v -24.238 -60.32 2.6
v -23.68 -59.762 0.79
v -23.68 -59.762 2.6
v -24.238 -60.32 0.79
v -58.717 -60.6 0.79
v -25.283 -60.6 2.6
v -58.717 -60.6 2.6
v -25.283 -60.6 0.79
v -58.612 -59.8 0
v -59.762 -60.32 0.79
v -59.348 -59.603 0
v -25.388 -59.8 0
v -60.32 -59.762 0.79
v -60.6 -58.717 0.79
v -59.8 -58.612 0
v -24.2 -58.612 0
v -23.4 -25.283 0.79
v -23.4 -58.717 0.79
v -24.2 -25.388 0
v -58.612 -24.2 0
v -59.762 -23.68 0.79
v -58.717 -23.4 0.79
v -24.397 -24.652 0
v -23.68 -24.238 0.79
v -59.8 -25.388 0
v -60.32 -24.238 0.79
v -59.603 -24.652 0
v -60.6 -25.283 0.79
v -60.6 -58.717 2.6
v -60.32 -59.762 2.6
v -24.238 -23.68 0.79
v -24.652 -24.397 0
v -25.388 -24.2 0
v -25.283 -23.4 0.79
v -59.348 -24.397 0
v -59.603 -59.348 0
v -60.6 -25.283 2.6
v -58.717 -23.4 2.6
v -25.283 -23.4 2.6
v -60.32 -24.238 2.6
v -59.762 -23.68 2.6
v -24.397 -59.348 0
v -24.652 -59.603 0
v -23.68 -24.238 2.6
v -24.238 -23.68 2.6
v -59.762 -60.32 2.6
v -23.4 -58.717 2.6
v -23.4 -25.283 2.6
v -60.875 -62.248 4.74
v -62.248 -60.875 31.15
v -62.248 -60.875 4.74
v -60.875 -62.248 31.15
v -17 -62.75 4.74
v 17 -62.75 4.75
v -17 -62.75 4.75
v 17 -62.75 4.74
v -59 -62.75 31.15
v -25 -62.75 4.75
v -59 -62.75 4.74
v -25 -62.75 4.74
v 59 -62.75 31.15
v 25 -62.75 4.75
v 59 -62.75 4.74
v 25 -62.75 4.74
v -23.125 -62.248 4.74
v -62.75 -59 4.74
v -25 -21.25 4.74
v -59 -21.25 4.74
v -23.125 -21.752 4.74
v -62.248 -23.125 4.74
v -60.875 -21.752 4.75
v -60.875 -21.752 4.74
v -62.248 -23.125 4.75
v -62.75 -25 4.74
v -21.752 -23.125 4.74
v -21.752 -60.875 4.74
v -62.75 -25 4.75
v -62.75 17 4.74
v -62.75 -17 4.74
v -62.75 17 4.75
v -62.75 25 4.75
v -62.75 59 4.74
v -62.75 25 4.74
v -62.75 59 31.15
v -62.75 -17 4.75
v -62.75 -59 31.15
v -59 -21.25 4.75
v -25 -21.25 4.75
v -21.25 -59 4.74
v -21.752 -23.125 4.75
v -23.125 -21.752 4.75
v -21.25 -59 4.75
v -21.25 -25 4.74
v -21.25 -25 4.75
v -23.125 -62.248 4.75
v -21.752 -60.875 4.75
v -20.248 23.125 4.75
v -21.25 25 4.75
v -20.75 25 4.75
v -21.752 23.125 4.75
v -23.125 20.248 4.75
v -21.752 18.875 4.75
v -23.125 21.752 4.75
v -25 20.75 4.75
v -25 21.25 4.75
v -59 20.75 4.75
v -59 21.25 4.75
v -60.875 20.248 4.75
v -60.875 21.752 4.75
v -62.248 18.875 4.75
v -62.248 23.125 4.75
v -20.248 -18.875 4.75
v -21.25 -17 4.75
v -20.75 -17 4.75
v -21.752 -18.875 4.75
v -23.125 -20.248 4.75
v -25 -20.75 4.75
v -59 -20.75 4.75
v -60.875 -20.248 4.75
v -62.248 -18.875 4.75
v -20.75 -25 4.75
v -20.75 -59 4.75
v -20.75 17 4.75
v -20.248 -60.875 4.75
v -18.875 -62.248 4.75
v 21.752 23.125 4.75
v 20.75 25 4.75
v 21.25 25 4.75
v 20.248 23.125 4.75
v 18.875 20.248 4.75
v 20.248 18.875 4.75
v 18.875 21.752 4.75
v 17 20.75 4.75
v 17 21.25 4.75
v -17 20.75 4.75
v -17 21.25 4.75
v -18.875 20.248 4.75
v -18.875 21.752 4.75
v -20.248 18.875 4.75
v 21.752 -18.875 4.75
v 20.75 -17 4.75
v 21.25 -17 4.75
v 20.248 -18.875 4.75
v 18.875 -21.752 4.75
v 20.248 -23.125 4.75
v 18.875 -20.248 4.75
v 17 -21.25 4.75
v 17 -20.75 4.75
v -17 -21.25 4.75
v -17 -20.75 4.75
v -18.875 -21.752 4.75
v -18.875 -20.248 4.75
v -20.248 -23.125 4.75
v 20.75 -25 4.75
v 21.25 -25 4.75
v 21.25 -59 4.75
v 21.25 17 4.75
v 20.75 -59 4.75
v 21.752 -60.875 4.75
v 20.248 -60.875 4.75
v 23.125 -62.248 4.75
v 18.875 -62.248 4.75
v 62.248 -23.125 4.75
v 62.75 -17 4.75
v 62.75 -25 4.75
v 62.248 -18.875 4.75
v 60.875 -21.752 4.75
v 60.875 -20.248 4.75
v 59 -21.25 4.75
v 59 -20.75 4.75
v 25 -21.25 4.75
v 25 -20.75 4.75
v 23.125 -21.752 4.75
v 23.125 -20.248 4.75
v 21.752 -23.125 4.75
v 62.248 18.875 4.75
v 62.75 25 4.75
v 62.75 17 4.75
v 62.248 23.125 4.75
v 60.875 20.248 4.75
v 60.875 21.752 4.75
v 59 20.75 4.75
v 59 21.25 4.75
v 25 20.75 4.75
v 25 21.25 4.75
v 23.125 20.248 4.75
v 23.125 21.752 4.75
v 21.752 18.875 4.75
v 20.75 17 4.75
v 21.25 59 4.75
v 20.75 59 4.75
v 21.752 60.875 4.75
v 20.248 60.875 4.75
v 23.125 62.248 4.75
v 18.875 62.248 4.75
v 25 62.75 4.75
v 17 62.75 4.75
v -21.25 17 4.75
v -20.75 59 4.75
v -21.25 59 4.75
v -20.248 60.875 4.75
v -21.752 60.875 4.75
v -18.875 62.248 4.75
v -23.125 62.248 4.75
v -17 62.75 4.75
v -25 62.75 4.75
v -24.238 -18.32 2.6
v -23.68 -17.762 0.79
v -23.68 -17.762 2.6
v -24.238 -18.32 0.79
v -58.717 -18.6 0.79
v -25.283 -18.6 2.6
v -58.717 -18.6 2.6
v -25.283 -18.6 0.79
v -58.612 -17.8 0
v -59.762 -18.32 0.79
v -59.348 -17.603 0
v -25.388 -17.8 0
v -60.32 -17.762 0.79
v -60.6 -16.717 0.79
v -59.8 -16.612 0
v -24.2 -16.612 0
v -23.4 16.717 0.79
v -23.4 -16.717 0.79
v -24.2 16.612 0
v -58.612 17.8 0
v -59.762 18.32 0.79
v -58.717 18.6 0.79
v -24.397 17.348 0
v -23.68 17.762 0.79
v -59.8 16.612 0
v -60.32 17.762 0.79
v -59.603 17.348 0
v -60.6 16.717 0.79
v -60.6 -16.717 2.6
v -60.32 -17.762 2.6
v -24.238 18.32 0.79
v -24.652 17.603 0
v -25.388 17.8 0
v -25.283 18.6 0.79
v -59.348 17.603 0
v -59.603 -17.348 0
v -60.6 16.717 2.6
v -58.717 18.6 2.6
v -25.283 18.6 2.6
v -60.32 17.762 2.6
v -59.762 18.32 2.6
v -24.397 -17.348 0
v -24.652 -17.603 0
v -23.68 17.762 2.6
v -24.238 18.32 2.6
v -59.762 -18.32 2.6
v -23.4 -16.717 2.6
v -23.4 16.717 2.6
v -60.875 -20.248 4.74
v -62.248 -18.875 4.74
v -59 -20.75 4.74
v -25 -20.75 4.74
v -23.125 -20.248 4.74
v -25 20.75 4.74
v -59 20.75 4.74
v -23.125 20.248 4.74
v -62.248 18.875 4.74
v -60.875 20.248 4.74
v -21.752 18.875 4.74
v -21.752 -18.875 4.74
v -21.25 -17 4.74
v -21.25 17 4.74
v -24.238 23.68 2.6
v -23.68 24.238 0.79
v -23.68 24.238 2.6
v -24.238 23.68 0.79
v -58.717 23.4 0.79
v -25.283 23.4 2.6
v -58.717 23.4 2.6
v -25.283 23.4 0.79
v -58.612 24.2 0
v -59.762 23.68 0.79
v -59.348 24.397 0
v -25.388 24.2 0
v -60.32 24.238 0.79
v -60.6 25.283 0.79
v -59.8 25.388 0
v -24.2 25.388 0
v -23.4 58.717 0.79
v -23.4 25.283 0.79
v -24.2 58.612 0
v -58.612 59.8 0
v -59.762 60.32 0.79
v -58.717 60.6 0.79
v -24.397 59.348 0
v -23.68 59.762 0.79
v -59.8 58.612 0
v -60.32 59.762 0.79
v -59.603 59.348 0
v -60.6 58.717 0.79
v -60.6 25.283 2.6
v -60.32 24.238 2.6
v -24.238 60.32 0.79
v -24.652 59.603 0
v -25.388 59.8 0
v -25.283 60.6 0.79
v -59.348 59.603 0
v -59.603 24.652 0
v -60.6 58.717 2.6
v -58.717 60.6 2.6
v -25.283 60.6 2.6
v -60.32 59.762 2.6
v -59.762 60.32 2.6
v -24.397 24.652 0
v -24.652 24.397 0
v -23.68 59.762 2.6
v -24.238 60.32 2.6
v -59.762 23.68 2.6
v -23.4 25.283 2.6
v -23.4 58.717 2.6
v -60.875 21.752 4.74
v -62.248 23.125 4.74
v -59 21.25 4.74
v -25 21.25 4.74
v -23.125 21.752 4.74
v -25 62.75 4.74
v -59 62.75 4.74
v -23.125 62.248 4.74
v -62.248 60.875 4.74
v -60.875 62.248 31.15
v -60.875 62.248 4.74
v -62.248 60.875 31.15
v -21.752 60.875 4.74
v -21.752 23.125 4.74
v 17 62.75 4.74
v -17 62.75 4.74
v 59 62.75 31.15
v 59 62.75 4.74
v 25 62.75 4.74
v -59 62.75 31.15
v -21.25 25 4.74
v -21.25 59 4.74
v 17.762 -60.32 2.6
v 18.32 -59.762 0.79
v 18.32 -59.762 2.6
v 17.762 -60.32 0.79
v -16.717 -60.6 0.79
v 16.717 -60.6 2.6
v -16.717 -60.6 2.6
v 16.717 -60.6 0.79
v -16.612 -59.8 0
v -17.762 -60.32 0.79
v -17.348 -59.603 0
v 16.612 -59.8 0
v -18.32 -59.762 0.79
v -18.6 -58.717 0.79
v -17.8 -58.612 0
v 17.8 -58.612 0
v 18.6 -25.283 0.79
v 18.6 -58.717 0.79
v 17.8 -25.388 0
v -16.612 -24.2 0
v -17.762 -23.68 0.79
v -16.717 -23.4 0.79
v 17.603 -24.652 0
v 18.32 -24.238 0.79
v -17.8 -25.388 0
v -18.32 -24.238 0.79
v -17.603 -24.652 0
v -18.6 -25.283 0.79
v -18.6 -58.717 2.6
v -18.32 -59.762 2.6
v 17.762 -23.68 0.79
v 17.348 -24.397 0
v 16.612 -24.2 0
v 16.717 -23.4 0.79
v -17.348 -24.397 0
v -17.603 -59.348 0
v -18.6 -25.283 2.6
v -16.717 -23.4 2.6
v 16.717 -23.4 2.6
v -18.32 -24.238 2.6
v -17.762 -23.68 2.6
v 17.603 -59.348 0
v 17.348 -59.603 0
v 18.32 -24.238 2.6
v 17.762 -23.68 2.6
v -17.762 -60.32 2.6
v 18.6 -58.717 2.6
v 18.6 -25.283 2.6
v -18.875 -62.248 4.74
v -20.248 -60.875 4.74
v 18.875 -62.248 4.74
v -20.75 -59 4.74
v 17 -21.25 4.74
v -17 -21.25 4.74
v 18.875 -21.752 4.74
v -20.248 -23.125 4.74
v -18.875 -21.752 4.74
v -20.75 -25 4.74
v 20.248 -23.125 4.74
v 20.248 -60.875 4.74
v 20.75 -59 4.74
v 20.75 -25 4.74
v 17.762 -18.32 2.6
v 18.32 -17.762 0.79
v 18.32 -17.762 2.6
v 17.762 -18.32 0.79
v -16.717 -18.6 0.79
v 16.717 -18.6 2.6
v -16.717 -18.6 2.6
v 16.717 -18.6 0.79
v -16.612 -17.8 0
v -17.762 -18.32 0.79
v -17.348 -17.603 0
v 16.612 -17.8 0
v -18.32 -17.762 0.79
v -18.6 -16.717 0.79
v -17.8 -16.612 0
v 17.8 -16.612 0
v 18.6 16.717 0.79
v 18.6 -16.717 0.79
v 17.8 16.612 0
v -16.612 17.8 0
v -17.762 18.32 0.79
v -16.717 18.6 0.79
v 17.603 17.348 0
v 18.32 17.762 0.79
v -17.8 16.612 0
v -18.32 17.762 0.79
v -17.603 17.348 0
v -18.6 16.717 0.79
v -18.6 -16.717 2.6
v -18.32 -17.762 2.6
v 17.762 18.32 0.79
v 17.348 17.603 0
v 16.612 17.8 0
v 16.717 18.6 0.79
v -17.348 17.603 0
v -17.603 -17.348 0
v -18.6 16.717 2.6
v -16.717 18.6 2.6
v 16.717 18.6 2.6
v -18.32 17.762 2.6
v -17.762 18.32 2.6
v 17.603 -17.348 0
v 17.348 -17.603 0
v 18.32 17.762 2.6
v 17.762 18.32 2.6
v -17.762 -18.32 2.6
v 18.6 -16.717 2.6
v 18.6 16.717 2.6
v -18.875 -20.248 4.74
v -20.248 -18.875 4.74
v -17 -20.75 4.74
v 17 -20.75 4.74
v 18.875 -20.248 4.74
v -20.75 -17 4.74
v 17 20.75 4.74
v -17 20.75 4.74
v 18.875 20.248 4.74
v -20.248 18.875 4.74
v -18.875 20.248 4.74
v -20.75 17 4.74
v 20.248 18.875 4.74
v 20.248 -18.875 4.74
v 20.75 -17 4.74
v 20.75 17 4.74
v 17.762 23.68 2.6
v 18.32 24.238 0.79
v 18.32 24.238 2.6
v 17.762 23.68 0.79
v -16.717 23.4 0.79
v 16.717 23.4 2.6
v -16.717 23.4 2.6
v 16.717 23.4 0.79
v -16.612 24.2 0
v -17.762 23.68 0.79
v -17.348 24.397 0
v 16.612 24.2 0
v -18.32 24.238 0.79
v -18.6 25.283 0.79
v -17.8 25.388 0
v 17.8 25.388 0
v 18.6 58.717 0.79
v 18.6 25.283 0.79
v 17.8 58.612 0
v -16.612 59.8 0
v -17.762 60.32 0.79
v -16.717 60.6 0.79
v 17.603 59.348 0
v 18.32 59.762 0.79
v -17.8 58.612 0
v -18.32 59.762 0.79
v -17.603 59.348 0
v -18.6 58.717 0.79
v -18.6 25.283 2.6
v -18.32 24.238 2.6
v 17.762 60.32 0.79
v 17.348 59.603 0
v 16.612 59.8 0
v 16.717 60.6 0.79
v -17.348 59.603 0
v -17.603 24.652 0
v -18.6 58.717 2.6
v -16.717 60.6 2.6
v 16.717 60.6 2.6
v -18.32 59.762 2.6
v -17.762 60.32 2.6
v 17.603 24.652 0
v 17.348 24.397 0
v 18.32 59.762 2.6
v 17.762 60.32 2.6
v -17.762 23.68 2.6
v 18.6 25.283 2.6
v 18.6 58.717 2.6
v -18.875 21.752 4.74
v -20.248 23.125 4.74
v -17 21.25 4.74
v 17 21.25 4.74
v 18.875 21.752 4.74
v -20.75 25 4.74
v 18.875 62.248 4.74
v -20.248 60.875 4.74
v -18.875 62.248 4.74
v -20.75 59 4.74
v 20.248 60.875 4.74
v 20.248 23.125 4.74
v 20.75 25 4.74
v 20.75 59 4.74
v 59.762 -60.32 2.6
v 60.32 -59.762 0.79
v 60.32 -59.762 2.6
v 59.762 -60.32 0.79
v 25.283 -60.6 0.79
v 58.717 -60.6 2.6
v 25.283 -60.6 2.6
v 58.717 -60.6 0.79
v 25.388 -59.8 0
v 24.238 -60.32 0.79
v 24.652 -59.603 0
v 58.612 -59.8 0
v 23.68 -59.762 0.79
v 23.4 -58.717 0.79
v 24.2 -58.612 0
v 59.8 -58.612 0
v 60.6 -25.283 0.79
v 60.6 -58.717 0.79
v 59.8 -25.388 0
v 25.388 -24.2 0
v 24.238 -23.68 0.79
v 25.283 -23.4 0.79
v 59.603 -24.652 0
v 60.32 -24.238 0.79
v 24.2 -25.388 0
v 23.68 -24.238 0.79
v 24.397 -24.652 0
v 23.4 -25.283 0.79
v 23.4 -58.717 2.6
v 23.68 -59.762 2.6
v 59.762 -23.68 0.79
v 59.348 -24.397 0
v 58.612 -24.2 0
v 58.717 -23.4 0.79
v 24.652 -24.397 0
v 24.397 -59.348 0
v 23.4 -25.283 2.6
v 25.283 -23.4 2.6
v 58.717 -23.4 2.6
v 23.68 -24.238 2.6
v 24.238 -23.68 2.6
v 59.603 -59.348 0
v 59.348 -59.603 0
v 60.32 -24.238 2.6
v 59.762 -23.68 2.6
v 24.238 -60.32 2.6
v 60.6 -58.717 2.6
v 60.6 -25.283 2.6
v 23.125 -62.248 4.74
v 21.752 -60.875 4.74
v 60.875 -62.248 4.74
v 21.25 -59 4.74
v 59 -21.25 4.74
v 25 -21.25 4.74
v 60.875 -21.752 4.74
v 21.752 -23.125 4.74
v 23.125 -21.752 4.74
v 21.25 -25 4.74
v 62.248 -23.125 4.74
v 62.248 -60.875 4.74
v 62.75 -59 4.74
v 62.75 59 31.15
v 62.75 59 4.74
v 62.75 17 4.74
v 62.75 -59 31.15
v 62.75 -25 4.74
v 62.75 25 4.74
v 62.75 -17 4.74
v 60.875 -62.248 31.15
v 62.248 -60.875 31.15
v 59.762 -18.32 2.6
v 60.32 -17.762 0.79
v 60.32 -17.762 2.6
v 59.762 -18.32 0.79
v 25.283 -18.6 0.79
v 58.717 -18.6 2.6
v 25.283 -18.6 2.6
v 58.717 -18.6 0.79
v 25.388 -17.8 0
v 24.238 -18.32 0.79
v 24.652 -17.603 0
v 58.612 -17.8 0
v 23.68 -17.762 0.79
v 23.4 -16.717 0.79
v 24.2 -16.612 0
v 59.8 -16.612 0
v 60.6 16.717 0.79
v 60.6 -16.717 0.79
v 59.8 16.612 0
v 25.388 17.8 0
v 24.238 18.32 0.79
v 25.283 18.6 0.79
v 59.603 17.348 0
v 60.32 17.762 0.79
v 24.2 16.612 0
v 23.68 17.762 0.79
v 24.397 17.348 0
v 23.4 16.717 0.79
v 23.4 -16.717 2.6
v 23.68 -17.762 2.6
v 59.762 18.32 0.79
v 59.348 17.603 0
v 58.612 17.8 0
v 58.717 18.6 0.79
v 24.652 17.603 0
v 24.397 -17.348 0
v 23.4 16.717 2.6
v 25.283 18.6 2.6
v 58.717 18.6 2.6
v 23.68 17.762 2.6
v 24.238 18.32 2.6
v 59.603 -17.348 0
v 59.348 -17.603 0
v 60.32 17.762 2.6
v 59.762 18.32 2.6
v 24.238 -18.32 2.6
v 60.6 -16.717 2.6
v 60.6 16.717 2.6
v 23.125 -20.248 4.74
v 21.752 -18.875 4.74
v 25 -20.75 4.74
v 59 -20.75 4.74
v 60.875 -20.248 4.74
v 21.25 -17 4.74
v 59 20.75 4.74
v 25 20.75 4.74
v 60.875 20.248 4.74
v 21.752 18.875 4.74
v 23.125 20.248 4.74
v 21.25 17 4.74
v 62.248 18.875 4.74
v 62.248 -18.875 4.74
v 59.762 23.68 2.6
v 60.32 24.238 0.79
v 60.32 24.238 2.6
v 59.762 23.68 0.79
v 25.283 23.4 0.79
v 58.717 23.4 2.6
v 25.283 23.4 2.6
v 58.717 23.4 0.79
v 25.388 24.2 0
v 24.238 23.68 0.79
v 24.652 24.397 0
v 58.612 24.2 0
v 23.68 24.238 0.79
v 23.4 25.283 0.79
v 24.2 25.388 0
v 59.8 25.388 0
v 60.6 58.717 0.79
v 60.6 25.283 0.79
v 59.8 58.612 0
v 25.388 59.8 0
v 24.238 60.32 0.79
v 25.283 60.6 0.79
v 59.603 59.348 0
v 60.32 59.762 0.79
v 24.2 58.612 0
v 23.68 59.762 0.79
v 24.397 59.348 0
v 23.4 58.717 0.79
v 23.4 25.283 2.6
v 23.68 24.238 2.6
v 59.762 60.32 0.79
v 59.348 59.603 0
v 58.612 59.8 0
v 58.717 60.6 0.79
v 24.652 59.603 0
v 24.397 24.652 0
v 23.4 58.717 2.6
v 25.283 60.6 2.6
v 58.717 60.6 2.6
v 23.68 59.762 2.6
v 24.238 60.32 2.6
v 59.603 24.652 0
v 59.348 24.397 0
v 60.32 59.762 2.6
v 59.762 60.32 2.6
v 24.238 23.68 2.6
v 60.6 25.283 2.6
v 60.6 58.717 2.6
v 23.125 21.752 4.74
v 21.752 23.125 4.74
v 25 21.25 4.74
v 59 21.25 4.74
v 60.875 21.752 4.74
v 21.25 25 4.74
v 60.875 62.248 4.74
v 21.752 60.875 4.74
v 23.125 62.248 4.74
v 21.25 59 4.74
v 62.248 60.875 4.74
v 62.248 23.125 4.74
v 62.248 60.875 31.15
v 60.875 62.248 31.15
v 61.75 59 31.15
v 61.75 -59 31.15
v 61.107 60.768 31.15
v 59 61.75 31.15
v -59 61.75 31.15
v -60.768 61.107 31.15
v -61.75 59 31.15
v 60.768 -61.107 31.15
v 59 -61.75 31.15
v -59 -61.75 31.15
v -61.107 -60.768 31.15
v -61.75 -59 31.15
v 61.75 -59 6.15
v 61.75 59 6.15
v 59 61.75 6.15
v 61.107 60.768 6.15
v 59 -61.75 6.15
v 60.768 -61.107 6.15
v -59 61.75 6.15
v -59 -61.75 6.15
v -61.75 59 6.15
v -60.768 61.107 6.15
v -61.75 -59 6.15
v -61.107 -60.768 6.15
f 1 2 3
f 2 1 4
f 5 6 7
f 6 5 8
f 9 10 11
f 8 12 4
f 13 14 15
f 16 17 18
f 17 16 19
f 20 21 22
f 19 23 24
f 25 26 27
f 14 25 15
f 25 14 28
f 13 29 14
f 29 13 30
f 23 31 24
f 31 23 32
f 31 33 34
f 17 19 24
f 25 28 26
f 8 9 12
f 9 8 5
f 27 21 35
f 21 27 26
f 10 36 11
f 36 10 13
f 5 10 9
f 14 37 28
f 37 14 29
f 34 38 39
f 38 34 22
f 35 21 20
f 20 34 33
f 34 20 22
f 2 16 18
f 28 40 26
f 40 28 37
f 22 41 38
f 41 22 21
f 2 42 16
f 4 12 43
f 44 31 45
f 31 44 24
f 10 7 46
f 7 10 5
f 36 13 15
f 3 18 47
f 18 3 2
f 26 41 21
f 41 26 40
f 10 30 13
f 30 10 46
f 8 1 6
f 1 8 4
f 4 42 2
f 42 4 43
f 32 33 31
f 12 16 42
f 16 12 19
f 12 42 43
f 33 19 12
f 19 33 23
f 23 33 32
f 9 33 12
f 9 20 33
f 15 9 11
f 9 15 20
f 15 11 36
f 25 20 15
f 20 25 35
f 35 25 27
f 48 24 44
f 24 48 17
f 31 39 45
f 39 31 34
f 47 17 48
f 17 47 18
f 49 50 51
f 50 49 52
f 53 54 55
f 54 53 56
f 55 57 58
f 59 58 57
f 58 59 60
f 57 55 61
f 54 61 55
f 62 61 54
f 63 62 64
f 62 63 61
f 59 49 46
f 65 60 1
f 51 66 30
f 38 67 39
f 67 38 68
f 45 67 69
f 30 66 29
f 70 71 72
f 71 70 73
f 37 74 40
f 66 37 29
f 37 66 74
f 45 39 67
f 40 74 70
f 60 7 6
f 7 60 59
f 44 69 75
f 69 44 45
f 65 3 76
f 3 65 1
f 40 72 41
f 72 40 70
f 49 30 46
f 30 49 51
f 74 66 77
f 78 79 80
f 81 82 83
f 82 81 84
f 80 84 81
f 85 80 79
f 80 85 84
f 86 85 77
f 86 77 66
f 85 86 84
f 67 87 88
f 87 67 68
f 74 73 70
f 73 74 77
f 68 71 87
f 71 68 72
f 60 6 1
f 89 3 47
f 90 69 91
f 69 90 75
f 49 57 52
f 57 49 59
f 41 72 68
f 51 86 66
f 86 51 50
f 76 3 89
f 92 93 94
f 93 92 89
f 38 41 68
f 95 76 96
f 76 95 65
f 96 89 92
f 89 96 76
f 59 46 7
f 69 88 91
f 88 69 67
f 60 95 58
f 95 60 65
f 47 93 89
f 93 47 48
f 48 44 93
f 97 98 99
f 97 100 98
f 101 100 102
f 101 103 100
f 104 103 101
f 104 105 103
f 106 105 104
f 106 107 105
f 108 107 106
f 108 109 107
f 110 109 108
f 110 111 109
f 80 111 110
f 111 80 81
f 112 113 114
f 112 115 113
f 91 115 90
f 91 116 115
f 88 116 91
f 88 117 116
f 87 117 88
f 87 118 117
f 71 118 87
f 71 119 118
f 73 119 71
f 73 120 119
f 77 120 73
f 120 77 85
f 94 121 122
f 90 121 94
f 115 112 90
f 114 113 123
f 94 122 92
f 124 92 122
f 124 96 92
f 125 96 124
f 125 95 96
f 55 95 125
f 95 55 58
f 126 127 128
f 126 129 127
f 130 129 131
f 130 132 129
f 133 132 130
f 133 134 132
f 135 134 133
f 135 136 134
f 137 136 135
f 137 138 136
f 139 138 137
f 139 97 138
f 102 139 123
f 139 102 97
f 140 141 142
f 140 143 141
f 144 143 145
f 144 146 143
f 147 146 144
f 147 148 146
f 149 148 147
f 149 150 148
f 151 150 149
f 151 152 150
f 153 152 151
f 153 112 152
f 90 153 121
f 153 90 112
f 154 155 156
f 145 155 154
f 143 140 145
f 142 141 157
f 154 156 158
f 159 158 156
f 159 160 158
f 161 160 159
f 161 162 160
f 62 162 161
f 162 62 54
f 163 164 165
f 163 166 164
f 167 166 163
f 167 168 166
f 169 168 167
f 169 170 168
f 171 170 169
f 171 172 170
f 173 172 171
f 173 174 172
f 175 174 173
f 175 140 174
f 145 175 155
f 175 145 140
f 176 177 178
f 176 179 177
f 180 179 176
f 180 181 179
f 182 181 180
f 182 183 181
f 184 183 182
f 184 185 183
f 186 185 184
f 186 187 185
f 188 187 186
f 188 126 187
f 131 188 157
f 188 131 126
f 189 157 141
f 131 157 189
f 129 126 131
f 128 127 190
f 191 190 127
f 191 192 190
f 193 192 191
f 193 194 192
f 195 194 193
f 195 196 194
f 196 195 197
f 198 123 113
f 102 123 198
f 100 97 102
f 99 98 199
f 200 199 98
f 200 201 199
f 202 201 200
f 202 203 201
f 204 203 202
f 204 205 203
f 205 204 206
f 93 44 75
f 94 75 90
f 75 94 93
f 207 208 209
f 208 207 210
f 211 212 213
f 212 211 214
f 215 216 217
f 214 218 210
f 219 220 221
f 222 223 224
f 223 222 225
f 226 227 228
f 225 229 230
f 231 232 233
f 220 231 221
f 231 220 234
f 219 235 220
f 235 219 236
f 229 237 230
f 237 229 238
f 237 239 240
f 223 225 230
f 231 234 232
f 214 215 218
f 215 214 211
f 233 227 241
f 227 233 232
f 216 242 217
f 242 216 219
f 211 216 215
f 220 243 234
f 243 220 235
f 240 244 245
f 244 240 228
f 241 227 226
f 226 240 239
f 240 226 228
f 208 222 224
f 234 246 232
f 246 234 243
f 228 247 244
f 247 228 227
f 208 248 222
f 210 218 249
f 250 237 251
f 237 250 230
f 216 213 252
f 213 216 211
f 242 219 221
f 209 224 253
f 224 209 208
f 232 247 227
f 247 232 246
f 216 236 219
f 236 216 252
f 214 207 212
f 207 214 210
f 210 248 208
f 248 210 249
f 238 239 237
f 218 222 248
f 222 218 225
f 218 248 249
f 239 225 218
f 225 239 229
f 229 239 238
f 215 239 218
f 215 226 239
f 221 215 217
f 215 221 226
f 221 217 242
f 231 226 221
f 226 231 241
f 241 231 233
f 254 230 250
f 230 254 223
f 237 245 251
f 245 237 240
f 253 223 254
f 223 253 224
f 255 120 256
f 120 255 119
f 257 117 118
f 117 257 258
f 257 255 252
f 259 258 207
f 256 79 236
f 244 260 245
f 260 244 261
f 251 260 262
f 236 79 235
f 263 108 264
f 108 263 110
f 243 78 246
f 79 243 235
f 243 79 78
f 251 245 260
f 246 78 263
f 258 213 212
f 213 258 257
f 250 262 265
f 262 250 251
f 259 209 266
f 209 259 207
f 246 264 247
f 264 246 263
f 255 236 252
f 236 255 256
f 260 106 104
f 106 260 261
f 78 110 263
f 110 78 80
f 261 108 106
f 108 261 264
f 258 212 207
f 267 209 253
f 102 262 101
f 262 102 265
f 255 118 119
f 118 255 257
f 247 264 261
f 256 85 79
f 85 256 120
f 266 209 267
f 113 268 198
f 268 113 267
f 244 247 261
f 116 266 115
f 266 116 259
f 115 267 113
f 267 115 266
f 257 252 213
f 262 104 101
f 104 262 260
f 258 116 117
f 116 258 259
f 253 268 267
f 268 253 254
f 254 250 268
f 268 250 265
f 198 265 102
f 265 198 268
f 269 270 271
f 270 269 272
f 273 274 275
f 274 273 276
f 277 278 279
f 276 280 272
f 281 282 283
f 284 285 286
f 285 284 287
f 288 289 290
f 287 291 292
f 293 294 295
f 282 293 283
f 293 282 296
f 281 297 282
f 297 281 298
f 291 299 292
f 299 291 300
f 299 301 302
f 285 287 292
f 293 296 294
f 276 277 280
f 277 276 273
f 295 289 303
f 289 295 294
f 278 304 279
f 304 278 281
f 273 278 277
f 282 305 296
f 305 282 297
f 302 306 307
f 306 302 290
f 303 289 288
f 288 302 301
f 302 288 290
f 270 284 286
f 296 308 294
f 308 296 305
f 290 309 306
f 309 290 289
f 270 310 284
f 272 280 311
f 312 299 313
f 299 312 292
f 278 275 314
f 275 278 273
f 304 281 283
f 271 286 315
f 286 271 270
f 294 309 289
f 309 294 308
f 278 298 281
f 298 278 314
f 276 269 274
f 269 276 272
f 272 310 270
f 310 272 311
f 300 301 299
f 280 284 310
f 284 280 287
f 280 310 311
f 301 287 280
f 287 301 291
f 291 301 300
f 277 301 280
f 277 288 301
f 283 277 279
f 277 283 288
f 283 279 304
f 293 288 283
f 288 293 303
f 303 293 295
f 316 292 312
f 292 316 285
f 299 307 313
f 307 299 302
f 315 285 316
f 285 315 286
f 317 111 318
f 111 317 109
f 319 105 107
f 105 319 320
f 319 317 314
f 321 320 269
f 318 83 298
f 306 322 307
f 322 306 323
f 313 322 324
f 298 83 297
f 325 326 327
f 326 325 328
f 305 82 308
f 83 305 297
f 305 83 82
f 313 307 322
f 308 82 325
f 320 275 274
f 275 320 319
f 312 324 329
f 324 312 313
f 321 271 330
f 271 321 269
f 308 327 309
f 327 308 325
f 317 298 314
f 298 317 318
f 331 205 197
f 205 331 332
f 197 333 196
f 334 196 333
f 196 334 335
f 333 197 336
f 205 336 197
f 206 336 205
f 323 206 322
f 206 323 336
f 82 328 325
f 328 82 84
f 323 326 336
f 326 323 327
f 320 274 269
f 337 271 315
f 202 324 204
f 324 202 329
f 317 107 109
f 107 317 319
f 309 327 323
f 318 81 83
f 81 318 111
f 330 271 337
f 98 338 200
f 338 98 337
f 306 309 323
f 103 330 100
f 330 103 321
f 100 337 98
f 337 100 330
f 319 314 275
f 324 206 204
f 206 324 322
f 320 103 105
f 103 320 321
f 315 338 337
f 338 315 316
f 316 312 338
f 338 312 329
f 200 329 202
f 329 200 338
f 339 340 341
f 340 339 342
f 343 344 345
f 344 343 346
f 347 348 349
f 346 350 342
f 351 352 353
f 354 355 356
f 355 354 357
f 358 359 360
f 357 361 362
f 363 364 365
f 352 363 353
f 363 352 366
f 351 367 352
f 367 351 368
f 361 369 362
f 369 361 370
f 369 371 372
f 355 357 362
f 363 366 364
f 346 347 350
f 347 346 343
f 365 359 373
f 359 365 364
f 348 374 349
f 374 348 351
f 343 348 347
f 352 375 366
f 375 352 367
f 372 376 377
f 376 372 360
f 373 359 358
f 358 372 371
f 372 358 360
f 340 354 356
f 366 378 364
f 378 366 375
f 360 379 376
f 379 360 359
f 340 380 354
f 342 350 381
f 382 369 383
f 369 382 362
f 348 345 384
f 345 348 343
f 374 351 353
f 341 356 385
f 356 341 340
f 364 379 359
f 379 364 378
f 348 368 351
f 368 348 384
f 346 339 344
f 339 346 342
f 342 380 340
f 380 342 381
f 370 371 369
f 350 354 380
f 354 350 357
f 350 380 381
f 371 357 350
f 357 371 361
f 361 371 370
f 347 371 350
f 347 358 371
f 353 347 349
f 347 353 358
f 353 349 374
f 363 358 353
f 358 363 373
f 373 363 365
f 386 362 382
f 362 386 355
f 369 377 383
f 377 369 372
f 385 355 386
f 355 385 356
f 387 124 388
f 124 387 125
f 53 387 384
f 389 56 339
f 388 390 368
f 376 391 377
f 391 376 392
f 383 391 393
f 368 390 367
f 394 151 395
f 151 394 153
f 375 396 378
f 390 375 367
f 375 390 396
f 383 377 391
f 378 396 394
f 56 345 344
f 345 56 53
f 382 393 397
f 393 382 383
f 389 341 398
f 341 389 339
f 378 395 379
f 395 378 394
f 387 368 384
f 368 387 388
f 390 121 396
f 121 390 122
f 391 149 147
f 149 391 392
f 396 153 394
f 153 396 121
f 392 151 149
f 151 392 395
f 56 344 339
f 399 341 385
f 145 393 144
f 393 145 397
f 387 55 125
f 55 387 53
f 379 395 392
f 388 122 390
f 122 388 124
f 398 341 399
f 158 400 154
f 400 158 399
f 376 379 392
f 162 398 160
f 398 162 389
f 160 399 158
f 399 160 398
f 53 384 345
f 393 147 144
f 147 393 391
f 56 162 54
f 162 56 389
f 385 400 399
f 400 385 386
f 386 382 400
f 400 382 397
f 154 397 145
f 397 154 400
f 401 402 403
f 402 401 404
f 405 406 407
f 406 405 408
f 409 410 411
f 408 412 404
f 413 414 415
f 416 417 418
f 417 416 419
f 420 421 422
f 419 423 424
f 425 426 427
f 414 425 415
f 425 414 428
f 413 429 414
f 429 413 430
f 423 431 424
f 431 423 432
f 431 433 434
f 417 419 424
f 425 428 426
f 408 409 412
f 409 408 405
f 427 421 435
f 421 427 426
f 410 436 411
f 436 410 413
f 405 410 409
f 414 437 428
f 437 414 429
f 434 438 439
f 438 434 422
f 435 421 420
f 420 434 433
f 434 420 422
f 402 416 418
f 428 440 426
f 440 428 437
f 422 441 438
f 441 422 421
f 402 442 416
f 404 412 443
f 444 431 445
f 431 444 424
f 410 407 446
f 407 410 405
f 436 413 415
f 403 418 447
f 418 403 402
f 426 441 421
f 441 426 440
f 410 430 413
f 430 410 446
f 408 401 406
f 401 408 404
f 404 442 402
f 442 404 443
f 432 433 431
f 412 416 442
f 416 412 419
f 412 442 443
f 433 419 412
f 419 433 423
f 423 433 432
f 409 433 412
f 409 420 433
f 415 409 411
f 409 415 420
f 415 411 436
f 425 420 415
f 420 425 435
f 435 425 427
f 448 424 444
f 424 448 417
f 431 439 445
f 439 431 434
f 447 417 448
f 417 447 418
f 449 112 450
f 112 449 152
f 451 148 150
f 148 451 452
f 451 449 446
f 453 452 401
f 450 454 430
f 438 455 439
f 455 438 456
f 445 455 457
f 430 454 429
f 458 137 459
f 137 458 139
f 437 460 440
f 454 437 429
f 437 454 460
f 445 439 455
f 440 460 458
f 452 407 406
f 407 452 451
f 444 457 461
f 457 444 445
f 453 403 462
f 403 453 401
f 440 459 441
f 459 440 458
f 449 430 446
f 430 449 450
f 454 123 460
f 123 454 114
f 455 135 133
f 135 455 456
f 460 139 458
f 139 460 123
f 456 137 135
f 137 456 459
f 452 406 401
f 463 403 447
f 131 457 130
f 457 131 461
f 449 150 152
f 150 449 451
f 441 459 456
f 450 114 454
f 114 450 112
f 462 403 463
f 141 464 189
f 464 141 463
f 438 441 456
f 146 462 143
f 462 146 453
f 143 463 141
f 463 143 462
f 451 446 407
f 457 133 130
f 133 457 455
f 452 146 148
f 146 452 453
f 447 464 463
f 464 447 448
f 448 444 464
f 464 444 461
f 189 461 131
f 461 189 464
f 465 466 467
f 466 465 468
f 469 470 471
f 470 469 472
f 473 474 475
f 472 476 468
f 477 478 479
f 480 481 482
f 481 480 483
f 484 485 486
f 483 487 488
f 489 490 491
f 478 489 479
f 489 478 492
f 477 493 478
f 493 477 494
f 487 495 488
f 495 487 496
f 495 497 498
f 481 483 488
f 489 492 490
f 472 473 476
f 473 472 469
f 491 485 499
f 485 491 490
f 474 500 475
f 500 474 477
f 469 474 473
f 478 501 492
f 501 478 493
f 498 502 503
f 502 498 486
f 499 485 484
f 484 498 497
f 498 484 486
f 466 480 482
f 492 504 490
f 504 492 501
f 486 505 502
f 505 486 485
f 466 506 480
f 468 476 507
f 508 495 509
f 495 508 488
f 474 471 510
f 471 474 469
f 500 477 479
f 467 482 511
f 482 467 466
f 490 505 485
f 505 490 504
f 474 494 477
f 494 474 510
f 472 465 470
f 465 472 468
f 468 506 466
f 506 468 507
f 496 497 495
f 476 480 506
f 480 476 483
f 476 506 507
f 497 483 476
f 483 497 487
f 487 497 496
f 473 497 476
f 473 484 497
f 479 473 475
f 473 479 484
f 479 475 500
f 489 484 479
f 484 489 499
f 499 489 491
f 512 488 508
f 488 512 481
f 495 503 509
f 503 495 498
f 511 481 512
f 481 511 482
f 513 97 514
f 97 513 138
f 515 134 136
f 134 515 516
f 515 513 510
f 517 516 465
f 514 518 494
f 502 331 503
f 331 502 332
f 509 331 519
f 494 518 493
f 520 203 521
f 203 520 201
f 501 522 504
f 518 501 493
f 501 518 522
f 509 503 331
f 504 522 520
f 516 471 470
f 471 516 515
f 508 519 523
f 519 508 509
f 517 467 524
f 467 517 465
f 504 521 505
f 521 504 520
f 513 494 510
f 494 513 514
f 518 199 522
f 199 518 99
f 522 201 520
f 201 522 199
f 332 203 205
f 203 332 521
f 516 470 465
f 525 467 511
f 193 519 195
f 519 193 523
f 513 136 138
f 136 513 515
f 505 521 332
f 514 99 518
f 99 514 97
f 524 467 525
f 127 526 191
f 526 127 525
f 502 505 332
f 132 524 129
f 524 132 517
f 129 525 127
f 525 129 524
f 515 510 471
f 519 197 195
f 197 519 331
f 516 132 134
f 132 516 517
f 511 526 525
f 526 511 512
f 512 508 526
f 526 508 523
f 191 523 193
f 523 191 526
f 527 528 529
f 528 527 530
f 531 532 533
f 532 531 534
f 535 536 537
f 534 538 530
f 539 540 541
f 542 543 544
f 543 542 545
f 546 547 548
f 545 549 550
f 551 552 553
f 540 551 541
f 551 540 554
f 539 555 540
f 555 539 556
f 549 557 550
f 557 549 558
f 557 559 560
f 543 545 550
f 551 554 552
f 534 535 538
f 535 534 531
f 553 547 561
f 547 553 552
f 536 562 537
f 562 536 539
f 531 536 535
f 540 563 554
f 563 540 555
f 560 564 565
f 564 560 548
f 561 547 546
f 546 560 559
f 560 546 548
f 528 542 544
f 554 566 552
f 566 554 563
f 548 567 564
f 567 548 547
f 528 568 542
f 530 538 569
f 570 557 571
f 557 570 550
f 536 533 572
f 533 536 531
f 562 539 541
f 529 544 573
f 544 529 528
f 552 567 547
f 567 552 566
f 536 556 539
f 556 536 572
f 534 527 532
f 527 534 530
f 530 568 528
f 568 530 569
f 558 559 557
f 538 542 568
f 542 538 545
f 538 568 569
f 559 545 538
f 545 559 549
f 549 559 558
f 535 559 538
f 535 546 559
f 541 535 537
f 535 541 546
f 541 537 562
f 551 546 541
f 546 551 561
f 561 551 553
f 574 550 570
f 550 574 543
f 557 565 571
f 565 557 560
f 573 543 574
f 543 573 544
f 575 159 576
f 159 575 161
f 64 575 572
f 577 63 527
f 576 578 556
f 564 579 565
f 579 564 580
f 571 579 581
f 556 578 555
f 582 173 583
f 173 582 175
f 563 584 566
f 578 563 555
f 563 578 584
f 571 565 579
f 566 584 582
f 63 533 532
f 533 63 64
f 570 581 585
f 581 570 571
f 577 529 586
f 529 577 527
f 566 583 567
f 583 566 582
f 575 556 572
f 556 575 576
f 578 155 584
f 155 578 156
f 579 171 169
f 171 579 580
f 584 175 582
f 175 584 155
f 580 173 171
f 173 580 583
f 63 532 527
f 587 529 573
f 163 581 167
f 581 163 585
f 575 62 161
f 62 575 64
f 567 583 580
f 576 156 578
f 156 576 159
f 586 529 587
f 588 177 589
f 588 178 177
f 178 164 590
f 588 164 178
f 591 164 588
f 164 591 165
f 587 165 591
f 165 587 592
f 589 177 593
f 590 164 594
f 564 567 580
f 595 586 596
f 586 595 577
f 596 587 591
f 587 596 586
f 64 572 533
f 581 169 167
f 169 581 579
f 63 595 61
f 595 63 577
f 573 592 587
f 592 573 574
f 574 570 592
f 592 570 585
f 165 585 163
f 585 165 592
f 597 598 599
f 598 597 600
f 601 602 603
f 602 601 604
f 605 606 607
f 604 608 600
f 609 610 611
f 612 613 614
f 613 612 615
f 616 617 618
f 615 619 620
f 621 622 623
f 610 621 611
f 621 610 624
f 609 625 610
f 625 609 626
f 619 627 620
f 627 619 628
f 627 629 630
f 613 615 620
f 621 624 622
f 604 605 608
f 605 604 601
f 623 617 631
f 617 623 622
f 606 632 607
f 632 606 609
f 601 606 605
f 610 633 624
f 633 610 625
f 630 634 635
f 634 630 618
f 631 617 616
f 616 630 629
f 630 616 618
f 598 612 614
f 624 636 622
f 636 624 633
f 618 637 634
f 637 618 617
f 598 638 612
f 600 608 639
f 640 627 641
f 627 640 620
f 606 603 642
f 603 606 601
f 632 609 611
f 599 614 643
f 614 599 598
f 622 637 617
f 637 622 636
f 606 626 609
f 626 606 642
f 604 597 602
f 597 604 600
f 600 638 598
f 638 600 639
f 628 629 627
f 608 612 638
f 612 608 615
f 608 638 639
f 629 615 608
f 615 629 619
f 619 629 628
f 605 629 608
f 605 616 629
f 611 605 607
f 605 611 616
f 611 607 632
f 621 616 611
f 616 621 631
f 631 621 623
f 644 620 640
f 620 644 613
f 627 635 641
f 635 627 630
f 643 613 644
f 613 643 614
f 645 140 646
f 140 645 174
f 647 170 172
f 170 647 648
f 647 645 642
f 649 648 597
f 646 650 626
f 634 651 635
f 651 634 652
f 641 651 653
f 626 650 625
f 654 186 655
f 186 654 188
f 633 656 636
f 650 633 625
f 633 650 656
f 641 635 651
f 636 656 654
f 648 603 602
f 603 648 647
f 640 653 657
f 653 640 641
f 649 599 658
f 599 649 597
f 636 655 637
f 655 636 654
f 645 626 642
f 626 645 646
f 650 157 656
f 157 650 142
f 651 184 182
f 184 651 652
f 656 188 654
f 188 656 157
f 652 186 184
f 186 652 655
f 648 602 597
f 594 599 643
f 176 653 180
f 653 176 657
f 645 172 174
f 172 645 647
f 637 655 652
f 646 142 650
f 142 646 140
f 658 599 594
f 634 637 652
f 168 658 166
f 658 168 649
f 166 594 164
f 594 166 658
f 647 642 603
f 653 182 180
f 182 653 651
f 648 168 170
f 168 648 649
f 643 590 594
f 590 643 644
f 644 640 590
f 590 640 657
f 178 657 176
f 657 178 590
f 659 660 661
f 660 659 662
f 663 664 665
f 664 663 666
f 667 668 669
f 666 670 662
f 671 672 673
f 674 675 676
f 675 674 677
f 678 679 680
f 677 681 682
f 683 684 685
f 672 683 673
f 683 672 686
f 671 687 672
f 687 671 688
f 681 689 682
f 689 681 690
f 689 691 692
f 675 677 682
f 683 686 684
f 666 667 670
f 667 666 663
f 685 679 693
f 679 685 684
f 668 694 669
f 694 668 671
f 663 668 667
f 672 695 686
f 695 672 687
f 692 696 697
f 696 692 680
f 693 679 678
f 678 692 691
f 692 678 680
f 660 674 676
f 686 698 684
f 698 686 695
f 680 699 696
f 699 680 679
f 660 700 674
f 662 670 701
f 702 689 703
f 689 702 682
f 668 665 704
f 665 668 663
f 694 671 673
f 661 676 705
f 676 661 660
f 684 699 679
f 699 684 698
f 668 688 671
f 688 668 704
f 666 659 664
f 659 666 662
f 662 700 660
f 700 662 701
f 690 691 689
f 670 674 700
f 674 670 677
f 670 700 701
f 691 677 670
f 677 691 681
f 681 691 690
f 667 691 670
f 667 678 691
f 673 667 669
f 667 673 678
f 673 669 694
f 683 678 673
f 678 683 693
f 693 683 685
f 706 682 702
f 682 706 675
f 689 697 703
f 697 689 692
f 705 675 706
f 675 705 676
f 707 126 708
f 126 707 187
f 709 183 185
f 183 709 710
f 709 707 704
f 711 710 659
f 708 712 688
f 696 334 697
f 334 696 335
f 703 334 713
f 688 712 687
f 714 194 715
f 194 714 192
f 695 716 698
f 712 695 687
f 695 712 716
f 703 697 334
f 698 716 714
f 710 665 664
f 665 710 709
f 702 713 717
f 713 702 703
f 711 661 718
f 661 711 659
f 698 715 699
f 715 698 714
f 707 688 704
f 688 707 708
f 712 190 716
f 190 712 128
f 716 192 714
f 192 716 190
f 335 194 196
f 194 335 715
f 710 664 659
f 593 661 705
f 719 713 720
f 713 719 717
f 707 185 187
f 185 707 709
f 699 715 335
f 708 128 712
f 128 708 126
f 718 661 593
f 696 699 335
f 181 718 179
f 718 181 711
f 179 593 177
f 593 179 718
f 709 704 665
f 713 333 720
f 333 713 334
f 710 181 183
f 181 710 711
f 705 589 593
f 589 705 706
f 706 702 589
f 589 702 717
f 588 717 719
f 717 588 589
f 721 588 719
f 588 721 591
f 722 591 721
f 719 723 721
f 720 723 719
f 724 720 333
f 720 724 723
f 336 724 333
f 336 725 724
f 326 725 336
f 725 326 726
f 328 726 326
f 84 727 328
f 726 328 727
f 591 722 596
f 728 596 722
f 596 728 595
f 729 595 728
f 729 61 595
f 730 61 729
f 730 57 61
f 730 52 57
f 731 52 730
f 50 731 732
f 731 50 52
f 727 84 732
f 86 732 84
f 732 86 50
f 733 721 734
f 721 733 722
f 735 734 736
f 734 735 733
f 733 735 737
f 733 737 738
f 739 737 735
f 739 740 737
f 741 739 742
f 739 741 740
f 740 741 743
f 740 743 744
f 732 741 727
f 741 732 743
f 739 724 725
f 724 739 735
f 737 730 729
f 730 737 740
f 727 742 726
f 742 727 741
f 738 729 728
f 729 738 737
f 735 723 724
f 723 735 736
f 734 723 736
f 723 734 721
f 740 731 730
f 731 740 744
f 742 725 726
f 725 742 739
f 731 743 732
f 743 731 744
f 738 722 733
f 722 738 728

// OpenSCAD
// file: ../lib/vessel.scad
// SPDX-License-Identifier: MIT
// Copyright (c) 2026 Aaron Cupp
//
// vessel.scad — parametric collar cups for bottles, cans, and pen-form tools.
//
// A collar cup is a solid Gridfinity block with cylindrical bores sunk into it.
// It LOCATES a vessel; it does not clamp one. That distinction is the whole
// design: a collar that grips harder than the bin weighs comes out of the
// baseplate with the bottle when you grab it one-handed. Clearance, not
// interference — CLR is per-diameter, not per-side.
//
// Capture depth is roughly a third of the vessel's height. Enough to resist a
// knock (this bench sits under a 180 W fume-extractor intake), not so much that
// you're fishing the bottle out.
//
//   collar_cup(nx, ny, vessel_d, capture_h, …)   — one centred bore
//   collar_cup_multi(nx, ny, bores, capture_h, …) — bores = [[x, y, d], …]
//
// Cord slot: pen-form tools that stand in a cup are usually corded (the HARDELL
// rotary tool takes a barrel jack). Without a slot the lead drapes over the rim
// and levers the tool sideways. `cord_w > 0` cuts a channel from the bore out
// through the wall, open to the top.

include <gridfinity.scad>

CLR      = 1.0;   // bore = vessel_d + CLR. Loose on purpose — see above.
MIN_WALL = 1.2;   // minimum material between two bores, and bore to outer face

// ---- geometry guards ----
// Overlapping bores and bores that break out through the side wall both still
// render as perfectly watertight, 2-manifold meshes — CI cannot tell you the
// part is wrong, only that it is closed. These asserts encode the intent that
// the mesh check can't. Cheap, and they fire at render time rather than on the
// printer.
function _pair_gaps(bores, clr) = [
    for (i = [0 : len(bores)-1], j = [0 : len(bores)-1]) if (i < j)
        norm([bores[i][0]-bores[j][0], bores[i][1]-bores[j][1]])
        - (bores[i][2]+clr)/2 - (bores[j][2]+clr)/2
];
function _edge_gaps(bores, clr, W, D) = [
    for (b = bores) min(W/2 - abs(b[0]) - (b[2]+clr)/2,
                        D/2 - abs(b[1]) - (b[2]+clr)/2)
];

// Multi-bore block. Bores are [x, y, diameter] in mm, relative to the block centre.
module collar_cup_multi(nx, ny, bores, capture_h, floor = 1.4, clr = CLR,
                        cord_w = 0, cord_at = 0, min_wall = MIN_WALL) {
    h = BIN_BASE_H + floor + capture_h;
    e = 0.1;
    W = nx*GF - 0.5; D = ny*GF - 0.5;
    _pg = _pair_gaps(bores, clr);
    _eg = _edge_gaps(bores, clr, W, D);
    assert(len(_pg) == 0 || min(_pg) >= min_wall,
           "collar_cup: bores are too close — they would merge into one pocket");
    assert(min(_eg) >= min_wall,
           "collar_cup: a bore breaches the outer wall — block needs more units");
    difference() {
        bin_blank(nx, ny, h);
        for (b = bores)
            translate([b[0], b[1], BIN_BASE_H + floor])
                cylinder(d = b[2] + clr, h = capture_h + e, $fn = 96);
        // Cord channel: from the first bore outward through the +X wall, open to
        // the rim so the lead drops in from above rather than threading.
        if (cord_w > 0)
            translate([bores[0][0], bores[0][1] - cord_w/2, BIN_BASE_H + floor + cord_at])
                cube([nx*GF, cord_w, h]);
    }
}

// Single centred bore — the common case.
module collar_cup(nx, ny, vessel_d, capture_h, floor = 1.4, clr = CLR,
                  cord_w = 0, cord_at = 0, min_wall = MIN_WALL) {
    collar_cup_multi(nx, ny, [[0, 0, vessel_d]], capture_h, floor, clr,
                     cord_w, cord_at, min_wall);
}

// Evenly spaced row of same-depth bores along X — for a rank of aerosol cans.
// Returns geometry, not a list; pass the diameters and it lays them out on the
// block's centre line.
module collar_cup_row(nx, ny, diameters, capture_h, floor = 1.4, clr = CLR,
                      min_wall = MIN_WALL) {
    n = len(diameters);
    pitch = nx * GF / n;
    collar_cup_multi(nx, ny,
        [for (i = [0 : n-1]) [(i - (n-1)/2) * pitch, 0, diameters[i]]],
        capture_h, floor, clr, 0, 0, min_wall);
}
// file: cleaning_station_common.scad
// cleaning_station_common.scad — shared parameters for the bench cleaning station.
//
// The IPA / contact-cleaner corner of the electronics repair bench. Everything
// here is measured off the actual items with calipers; nothing is a nominal from
// a product page. Diameters carry a per-diameter clearance (lib/vessel.scad CLR),
// not per-side.
//
// This corner sits under a fume-extractor intake, which drives two decisions:
//   * Cups CAPTURE the vessel rather than clamp it — a collar that grips harder
//     than the bin weighs lifts out of the baseplate with the bottle.
//   * Bins stay as low as the job allows. Capture velocity is decided in the
//     first six inches, and a wall of tall bins in front of the hood costs it.
//
// The aerosols are FLAMMABLE and this bench has a 400 °C iron on it. These cups
// are for working cans only; bulk stock belongs away from the hood entirely.
//
// SPDX-License-Identifier: CC-BY-NC-SA-4.0
// Copyright (c) 2026 Aaron Cupp

include <../lib/vessel.scad>

// ---- measured diameters (mm) ----
// DeoxIT bore: taken from the PART, not from a can measurement.
//
// The 2026-08-20 print had three bores — 57.00 / 55.20 / 52.75. The 57.00 fits a
// DeoxIT; 55.20 barely does; 52.75 holds nothing. So 57.00 is a validated bore,
// which beats re-deriving it from a can diameter plus a clearance guess. D5, F5
// and G5 are the same can, so one bore serves all three.
BORE_DEOXIT = 57.00;   // ✅ proven by the printed part

// Freeze spray is a DIFFERENT, LARGER can — 13 mm wider than a DeoxIT, which is
// why it never fitted a shared block.
D_FREEZE_SPRAY = 69.00;   // ✅ measured 2026-08-20 (was 56.00, badly wrong)
FREEZE_CLR     = 2.0;     // [1:0.5:4] -> 71.00 bore
FREEZE_MEASURED = true;

D_DISPENSER    = 53.50;   // 200 ml push-down alcohol pump, square base across flats
D_FLOOD_BOTTLE = 75.50;

// DeoxIT D100 / F100 / G100 concentrate droppers — bare bottles, out of their
// kit boxes. The boxes are a full 2×1 EACH; the three bare bottles share one.
// NOT ROUND — 39 × 20 is a flattened cross-section, not a diameter and a height.
D_DROPPER_L = 39.00;   // measured 2026-08-20, long axis of the footprint
D_DROPPER_W = 20.00;   // measured, short axis
DROPPER_CLR = 1.00;    // per dimension, matching the CLR convention
CAP_DROPPER = 26;      // [8:1:40] capture depth. ⚠️ bottle HEIGHT is unmeasured —
                       //   39 turned out to be a footprint, so the height nobody
                       //   has taken.
                       //   RAISED 15 → 26 on 2026-08-24: at 15 the brushes and
                       //   swabs fell over in their slots. Depth is what resists
                       //   an applicator tipping, and 15 mm of it on a ~100 mm
                       //   brush is almost none. 26 makes the whole block half
                       //   again as tall, which is what was asked for.
                       //   Read the bin_deoxit_droppers header before assuming
                       //   this alone fixes the tipping — it does not.

// ---- melamine sponges (mm) — 3.94 × 2.35 × 0.79 in ----
// Full block as sold. Bulk stock lives in the bag under the desk, ~100 of them;
// none of it competes for grid.
SPONGE_L = 100.1; SPONGE_W = 59.7; SPONGE_T = 20.1;

// WORKING size: a full block is far more sponge than any bench task needs, and
// melamine is consumed by abrasion — quartering one gets four uses out of what
// was one, and the smaller piece reaches between connectors where a 100 mm block
// cannot. Halve across, halve lengthwise.
CUT_L = SPONGE_L / 2;   // 50.05
CUT_W = SPONGE_W / 2;   // 29.85
CUT_T = SPONGE_T;       // 20.1 — unchanged, cuts are through the face

// ---- capture depth ----
// Vessel HEIGHTS were not measured, so this is a judgement call rather than a
// derived third-of-height: 50 mm resists a knock without making the bottles a
// two-handed retrieval. One number to change if the first print feels wrong.
CAPTURE = 50;

// Sponge bin: sponges stand ON EDGE (60 mm tall), ~4 across the 81 mm interior.
// On edge beats flat-stacked — same count in a 68 mm bin instead of a 107 mm one,
// and any sponge can be pinched out rather than peeling off the top of a pile.
// Height is set by a FULL block standing on edge, not a cut one — so one uncut
// block can still ride in the bin as reserve alongside the trimmed pieces.
// Cut pieces are 50 long, which is what lets the footprint drop to 2×2.
SPONGE_BIN_H = SPONGE_W + BIN_BASE_H + 1.4 + 2;   // ≈ 68
// main file
// bin_kimwipes — 3×3 tray for the Kimtech Kimwipes pop-up cube.
//
// HOW YOU USE IT:
//   The box drops in and stands proud. It dispenses from the TOP, so the tray
//   only has to stop it sliding around and being knocked over — it does not need
//   to swallow the box, and swallowing it would bury the pop-up.
//
// WHY IT IS SHALLOW. Capture is 25 mm, which holds the base and leaves the whole
// dispensing face clear. The box's HEIGHT has never been measured and does not
// need to be: anything taller than 25 mm simply stands further proud. That is
// the one dimension this part is deliberately independent of.
//
// ⚠️ WALLS ARE 1.0, NOT THE USUAL 1.2, AND THAT IS THE WHOLE DESIGN PROBLEM.
//
// The box is 119.60 × 122.86 (measured 2026-07-27). A 3×3 is 125.5 across, so at
// the normal 1.2 wall the interior is 123.10 and the long side clears by
// **0.24 mm** — that is not a fit, it is a coincidence. Dropping to 1.0 gives
// 123.50 and 0.64 mm, which a cardboard box will actually go into.
//
// If it still binds, the answer is a 3×4 (165.10 interior, 42 mm of slack) and
// not thinner walls. -D NY=4 does it without editing anything.
//
// ⚠️ THIS BOX ALSO SITS ON `scope-baseplate/scope_wipe_plate.scad`, which was
// built as a platform for it. That is a BASEPLATE — no walls — which is why the
// box fits there and only just fits here. Do not "fix" this by copying that
// part's clearances.
//
// PRINT: as emitted, feet down. No supports.
//
// SPDX-License-Identifier: CC-BY-NC-SA-4.0
// Copyright (c) 2026 Aaron Cupp
include <cleaning_station_common.scad>
include <../lib/gridfinity.scad>

/* [Box] */
BOX_L = 119.60;   // measured 2026-07-27
BOX_W = 122.86;   // measured — the tight axis

/* [Tray] */
NX = 3; NY = 3;
DEPTH = 25;       // [12:1:60] capture. Box height is irrelevant — see header.
WALL  = 1.0;      // [0.8:0.1:2] see the note above before raising this
FLOOR = 1.4;

H  = BIN_BASE_H + FLOOR + DEPTH;
W  = NX*GF - 0.5; D = NY*GF - 0.5;
IW = W - 2*WALL;  ID = D - 2*WALL;
Z0 = BIN_BASE_H + FLOOR;

assert(IW >= BOX_L + 0.3, str("Box (", BOX_L, ") will not go in ", IW, " mm."));
assert(ID >= BOX_W + 0.3, str("Box (", BOX_W, ") will not go in ", ID,
                              " mm — go to a 3x4 with -D NY=4."));
echo(str("interior ", IW, " x ", ID, "; box ", BOX_L, " x ", BOX_W,
         " -> slack ", IW - BOX_L, " / ", ID - BOX_W, " mm"));

// The pocket is the FULL interior, clipped to the rounded corners. A plain cube
// spanning IW x ID would cut straight through bin_blank's corner radii and open
// all four corners — watertight, right bbox, and not a box. Two bins shipped
// that way. tools/validate_stl.py now fails it.
difference() {
    bin_blank(NX, NY, H);
    intersection() {
        translate([-IW/2, -ID/2, Z0]) cube([IW, ID, DEPTH + 0.1]);
        translate([0, 0, Z0]) linear_extrude(DEPTH + 0.2)
            offset(BIN_R - WALL) offset(-(BIN_R - WALL))
                square([IW, ID], center = true);
    }
}
